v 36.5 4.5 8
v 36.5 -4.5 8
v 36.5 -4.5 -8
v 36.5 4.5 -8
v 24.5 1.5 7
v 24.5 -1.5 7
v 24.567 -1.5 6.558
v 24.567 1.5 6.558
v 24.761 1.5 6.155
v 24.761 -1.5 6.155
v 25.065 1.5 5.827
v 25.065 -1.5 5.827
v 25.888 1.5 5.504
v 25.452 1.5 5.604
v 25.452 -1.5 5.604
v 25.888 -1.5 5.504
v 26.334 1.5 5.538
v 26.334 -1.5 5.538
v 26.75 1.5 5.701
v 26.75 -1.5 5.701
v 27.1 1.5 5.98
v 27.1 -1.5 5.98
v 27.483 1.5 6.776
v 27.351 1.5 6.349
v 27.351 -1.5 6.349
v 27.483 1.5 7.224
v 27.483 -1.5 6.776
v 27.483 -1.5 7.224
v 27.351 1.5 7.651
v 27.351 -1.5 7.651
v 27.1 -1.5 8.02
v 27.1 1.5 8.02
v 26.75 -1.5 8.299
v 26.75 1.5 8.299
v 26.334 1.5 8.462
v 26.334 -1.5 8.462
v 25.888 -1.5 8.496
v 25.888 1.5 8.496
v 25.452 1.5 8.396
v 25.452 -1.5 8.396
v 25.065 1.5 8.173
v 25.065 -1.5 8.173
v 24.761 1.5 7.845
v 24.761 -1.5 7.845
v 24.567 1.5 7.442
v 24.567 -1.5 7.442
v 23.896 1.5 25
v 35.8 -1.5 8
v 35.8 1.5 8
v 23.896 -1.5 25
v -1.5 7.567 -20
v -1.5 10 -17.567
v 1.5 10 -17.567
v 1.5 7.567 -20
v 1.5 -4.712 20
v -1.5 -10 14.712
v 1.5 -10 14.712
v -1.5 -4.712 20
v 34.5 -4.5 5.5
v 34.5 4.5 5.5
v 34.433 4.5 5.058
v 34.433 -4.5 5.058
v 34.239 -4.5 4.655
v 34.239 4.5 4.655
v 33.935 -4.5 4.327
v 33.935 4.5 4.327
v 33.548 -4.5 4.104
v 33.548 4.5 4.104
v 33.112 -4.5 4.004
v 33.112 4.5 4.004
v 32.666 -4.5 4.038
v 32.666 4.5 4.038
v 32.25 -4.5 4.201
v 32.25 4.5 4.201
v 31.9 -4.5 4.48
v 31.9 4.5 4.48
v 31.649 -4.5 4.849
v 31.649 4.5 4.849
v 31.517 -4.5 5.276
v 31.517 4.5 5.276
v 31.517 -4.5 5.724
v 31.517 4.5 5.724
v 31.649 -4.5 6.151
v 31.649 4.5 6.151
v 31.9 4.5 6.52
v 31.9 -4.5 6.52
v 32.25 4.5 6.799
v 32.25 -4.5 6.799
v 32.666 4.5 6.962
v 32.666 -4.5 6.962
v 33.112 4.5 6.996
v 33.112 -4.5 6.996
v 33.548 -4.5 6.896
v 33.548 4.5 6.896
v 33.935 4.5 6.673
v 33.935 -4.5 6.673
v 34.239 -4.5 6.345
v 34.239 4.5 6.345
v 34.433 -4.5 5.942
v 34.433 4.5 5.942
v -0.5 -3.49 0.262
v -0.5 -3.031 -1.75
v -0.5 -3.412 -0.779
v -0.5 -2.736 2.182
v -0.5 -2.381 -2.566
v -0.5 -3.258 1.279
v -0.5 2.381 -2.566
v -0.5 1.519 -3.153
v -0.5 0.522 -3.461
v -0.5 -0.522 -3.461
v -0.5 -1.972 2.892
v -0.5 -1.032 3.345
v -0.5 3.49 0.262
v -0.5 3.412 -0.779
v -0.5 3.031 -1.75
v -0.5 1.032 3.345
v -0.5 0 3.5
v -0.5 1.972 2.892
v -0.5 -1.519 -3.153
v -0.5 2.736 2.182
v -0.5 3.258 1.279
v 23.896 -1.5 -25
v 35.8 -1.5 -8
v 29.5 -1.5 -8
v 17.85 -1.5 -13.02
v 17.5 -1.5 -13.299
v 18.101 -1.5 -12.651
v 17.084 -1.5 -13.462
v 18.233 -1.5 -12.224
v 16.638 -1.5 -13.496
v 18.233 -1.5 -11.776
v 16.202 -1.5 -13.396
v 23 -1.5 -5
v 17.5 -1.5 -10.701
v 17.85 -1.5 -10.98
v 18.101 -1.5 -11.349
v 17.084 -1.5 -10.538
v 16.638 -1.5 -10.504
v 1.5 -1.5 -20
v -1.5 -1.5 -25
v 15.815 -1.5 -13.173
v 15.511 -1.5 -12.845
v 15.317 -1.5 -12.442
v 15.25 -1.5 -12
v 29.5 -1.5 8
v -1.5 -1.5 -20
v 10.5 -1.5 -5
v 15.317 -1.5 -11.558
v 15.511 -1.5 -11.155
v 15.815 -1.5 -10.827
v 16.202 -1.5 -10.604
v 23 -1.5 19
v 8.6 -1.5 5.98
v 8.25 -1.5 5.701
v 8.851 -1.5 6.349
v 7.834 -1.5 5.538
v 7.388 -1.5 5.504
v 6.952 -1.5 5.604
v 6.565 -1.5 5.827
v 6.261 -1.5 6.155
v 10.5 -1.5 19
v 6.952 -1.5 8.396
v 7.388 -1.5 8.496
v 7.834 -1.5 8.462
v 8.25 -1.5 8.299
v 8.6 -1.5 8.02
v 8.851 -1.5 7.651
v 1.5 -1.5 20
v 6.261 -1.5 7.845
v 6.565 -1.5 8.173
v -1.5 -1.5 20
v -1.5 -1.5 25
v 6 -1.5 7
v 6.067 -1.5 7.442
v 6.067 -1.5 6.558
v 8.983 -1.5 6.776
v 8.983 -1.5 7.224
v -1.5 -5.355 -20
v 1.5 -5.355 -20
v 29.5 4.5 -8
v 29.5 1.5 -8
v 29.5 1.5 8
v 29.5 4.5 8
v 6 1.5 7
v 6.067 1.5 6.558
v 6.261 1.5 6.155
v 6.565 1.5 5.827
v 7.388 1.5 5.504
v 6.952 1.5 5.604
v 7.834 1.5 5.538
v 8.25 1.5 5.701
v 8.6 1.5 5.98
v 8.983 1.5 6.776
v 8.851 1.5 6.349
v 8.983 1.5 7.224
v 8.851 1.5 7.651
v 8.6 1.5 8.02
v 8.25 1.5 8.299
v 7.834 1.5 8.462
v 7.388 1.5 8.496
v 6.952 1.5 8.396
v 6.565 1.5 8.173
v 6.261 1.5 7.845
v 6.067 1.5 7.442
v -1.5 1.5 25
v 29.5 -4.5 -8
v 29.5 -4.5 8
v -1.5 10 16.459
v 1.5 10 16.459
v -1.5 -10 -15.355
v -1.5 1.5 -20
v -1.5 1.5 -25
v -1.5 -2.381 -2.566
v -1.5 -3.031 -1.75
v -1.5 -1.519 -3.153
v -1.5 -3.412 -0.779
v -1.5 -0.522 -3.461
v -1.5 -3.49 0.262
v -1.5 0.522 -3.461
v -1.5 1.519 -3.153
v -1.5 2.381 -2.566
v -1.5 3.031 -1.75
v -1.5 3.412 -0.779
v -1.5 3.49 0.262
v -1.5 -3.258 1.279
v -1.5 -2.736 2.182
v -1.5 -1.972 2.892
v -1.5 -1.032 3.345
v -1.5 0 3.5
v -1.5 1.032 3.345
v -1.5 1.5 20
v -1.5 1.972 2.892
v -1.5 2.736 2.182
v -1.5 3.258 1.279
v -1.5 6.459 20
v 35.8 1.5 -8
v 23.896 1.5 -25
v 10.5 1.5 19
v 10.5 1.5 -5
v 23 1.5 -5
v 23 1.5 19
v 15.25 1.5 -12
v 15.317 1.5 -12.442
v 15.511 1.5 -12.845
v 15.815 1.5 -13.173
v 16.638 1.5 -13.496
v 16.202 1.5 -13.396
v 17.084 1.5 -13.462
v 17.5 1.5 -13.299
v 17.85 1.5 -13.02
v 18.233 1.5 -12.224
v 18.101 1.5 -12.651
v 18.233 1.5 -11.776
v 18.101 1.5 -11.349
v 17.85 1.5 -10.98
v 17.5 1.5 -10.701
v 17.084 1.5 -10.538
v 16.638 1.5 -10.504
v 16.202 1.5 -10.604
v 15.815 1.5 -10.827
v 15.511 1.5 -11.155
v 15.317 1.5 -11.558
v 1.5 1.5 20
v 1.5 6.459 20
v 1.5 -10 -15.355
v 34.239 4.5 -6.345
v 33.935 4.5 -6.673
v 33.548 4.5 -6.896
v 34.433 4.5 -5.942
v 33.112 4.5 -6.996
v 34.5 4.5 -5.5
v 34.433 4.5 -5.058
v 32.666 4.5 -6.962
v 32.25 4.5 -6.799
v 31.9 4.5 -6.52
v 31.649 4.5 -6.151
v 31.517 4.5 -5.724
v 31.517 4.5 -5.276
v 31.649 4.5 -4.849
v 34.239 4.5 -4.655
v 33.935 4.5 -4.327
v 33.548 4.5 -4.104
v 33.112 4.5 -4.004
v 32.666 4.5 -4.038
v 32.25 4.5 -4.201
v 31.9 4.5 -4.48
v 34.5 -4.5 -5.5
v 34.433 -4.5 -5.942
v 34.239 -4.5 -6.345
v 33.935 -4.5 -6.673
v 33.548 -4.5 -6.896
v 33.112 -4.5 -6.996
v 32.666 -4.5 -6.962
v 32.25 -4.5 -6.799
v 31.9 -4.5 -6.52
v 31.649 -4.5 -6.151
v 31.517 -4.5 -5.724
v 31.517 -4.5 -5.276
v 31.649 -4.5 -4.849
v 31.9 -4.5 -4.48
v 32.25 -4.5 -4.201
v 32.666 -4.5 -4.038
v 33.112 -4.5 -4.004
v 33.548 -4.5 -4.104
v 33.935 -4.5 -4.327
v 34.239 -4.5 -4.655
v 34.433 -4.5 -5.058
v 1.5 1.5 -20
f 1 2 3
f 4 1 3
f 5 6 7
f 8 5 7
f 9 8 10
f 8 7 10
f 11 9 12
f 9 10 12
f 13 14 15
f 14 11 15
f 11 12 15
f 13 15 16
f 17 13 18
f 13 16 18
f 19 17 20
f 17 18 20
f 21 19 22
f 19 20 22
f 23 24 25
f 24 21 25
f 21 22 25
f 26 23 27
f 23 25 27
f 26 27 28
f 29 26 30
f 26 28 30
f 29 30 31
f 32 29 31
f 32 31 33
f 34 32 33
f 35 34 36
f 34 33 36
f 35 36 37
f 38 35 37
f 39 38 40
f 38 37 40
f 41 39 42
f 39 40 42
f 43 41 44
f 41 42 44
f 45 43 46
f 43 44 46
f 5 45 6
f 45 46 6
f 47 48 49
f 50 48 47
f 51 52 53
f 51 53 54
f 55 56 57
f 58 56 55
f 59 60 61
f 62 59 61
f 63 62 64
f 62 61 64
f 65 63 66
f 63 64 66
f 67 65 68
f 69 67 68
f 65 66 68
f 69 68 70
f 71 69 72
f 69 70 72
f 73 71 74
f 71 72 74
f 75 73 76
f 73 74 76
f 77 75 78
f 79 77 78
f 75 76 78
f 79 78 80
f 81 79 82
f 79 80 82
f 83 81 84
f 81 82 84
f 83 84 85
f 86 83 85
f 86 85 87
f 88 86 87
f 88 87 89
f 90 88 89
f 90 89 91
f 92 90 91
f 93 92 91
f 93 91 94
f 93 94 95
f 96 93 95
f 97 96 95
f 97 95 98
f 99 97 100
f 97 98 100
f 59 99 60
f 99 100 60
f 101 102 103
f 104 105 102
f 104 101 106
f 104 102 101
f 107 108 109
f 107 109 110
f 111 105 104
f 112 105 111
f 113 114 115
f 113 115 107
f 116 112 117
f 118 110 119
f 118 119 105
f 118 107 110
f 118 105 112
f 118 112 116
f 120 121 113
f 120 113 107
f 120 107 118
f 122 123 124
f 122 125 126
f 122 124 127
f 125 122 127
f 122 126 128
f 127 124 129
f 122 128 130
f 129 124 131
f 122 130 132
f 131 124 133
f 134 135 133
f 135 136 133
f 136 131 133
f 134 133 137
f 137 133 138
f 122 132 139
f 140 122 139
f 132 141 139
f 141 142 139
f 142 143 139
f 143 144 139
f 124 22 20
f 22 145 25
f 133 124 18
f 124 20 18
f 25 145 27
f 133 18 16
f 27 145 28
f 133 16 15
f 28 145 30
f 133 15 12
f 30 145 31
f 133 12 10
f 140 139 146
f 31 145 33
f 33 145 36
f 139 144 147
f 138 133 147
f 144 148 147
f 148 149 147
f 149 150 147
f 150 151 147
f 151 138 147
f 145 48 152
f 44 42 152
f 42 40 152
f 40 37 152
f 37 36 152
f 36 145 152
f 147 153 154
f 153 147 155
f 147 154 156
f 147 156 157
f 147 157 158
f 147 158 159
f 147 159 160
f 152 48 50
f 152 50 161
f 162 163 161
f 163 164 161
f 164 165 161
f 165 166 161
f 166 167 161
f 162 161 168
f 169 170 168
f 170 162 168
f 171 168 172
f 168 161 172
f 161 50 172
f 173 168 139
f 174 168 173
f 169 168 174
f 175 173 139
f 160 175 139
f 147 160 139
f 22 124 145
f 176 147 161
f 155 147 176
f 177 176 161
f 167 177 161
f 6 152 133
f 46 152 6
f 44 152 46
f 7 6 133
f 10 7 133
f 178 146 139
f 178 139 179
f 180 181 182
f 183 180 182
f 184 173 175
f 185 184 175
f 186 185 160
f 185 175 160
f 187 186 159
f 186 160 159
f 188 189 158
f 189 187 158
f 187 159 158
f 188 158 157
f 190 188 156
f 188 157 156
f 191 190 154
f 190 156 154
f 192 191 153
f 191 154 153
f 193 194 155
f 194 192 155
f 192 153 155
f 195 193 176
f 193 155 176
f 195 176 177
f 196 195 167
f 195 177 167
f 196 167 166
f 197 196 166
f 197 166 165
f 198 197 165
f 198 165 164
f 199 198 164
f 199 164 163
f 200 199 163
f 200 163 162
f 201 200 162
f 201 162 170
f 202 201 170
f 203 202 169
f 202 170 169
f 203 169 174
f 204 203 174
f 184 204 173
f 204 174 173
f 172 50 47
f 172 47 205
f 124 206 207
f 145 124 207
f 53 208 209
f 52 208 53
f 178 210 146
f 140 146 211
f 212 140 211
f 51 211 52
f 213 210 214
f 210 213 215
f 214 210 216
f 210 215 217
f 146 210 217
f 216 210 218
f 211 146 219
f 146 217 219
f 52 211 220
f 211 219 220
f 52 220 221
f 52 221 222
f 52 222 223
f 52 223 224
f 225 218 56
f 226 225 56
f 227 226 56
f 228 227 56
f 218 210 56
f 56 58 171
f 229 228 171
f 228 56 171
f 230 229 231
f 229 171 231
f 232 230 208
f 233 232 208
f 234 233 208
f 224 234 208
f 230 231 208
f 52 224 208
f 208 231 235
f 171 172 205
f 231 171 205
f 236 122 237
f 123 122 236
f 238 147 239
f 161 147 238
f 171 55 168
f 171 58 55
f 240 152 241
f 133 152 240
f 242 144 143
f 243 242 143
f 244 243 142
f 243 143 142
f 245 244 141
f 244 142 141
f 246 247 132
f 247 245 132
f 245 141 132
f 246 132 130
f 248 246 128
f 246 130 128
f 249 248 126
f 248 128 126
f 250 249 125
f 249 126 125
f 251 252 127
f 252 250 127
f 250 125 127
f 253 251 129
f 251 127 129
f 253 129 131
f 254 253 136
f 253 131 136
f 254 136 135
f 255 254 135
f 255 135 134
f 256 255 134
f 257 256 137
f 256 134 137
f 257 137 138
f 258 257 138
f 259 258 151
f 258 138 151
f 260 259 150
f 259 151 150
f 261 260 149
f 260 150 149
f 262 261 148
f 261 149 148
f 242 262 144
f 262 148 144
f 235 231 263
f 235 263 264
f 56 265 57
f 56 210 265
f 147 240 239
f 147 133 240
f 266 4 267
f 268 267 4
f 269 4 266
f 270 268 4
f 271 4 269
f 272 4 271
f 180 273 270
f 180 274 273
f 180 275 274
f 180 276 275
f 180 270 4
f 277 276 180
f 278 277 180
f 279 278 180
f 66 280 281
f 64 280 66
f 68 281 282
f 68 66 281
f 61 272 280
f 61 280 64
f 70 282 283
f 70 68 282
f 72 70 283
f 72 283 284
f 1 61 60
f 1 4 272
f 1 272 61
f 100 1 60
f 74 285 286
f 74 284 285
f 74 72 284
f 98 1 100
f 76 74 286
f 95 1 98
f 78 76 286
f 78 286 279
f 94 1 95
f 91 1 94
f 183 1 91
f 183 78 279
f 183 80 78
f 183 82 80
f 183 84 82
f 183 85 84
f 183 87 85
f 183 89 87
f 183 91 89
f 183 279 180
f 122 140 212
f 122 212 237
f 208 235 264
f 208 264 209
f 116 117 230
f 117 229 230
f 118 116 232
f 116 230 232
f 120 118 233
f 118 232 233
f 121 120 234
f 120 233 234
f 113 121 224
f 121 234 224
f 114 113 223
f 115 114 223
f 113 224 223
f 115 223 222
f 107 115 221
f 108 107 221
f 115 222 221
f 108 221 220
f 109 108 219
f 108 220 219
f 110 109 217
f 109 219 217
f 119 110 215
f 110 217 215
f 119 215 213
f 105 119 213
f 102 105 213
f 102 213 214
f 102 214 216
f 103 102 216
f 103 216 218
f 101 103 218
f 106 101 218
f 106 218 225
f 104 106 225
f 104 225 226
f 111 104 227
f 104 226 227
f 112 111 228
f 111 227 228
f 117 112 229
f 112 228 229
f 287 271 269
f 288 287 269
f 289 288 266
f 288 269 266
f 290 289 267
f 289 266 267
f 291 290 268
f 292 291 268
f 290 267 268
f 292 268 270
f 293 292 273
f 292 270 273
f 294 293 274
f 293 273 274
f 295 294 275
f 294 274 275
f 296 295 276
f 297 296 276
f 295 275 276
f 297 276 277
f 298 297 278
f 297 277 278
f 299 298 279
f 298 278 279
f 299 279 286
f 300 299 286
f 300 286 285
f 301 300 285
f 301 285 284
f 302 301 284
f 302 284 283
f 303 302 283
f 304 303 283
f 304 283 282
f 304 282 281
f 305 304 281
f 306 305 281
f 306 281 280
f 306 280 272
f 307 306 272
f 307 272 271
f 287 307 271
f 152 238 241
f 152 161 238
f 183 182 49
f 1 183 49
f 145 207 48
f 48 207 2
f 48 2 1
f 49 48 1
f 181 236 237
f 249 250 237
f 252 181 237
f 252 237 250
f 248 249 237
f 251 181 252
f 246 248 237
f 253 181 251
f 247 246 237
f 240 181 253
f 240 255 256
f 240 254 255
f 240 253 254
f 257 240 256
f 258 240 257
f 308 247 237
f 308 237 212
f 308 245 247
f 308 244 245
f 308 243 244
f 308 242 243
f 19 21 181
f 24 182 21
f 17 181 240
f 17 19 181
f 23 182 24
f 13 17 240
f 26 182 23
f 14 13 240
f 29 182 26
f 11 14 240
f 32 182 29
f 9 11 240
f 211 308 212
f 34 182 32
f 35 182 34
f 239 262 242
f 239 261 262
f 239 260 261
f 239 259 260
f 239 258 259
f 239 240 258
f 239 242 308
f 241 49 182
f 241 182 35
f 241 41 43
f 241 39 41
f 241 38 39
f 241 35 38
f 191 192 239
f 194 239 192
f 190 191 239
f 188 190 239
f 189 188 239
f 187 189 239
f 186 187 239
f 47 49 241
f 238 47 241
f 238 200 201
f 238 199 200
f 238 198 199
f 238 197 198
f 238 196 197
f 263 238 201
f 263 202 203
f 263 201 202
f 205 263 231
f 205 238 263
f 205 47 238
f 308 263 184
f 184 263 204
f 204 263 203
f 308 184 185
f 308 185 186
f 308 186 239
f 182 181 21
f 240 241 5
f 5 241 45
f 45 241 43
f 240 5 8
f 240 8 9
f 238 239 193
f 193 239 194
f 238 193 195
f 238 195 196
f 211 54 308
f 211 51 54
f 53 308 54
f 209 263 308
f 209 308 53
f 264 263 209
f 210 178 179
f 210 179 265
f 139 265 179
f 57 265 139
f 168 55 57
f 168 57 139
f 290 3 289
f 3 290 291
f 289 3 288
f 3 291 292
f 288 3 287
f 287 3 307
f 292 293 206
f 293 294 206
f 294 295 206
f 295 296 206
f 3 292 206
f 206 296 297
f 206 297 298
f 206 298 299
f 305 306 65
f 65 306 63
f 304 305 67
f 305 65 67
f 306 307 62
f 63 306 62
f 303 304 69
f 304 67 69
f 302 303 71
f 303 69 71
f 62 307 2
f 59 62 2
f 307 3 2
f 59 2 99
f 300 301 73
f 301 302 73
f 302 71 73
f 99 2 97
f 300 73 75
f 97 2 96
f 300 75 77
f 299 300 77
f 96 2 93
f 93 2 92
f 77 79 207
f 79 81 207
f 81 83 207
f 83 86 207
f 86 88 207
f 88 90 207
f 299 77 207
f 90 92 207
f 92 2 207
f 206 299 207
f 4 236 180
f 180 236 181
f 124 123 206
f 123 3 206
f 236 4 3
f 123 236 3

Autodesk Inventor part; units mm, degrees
ref_plane "YZ Plane" through (0, 0, 0) normal (1, 0, 0) x (0, 1, 0)
ref_plane "XZ Plane" through (0, 0, 0) normal (0, 1, 0) x (-1, 0, 0)
ref_plane "XY Plane" through (0, 0, 0) normal (0, 0, 1) x (1, 0, 0)
sketch "Boceto1" plane through (0, 0, 0) normal (1, 0, 0) x (0, 1, 0)
  line L0 (10, 16.4587) -> (10, -17.5667)
  line L1 (10, -17.5667) -> (7.5667, -20)
  line L2 (7.5667, -20) -> (-5.3553, -20)
  line L3 (-5.3553, -20) -> (-10, -15.3553)
  line L4 (-10, -15.3553) -> (-10, 14.7117)
  line L5 (-10, 14.7117) -> (-4.7117, 20)
  line L6 (-4.7117, 20) -> (6.4587, 20)
  line L7 (6.4587, 20) -> (10, 16.4587)
  line L8 (0, 0) -> (31.525, 0) construction
  line L9 (0, 0) -> (0, -54.6434) construction
  dimension "d0" = 135
  dimension "d2" = 135
  dimension "d3" = 135
  dimension "d5" = 40
  dimension "d6" = 20
extrude "Extrusión1" add sketch "Boceto1" along normal mid plane 3
sketch "Boceto2" plane through (0, 0, 0) normal (0, 1, 0) x (-1, 0, 0)
  line L0 (0, 0) -> (-24, 0) construction
  line L1 (1.5, -25) -> (-23.8963, -25)
  line L2 (-23.8963, -25) -> (-36.5, -7)
  line L3 (-36.5, -7) -> (-36.5, 7)
  line L4 (-36.5, 7) -> (-23.8963, 25)
  line L5 (-23.8963, 25) -> (1.5, 25)
  line L6 (-1.5, 20) -> (1.5, 20) projected
  line L7 (-1.5, -15.3553) -> (-1.5, -20) projected
  line L8 (-1.5, 20) -> (-1.5, -20)
  line L9 (1.5, 20) -> (-1.5, 20)
  line L10 (1.5, -20) -> (1.5, -15.3553) projected
  line L11 (1.5, -20) -> (-1.5, -20) projected
  line L12 (1.5, -20) -> (-1.5, -20)
  line L13 (1.5, -20) -> (1.5, -25)
  line L14 (1.5, 20) -> (1.5, 25)
  line L15 (1.5, 16.4587) -> (1.5, -17.5667) projected
  line L16 (-10.5, 19) -> (-23, 19)
  line L17 (-23, 19) -> (-23, -5)
  line L18 (-23, -5) -> (-10.5, -5)
  line L19 (-10.5, -5) -> (-10.5, 19)
  line L20 (-10.5, 7) -> (-23, 7) construction
  circle A0 centre (-7.5, 7) radius 1.5
  circle A1 centre (-26, 7) radius 1.5
  circle A2 centre (-16.75, -12) radius 1.5
  line L21 (-16.75, -5) -> (-16.75, -34) construction
  dimension "d9" = 50
  dimension "d10" = 38
  dimension "d11" = 145
  dimension "d12" = 145
  dimension "d13" = 12.5
  dimension "d14" = 24
  dimension "d15" = 6
  dimension "d16" = 12
  dimension "d17" = 3
  dimension "d18" = 3
  dimension "d19" = 3
  dimension "d20" = 3
  dimension "d21" = 3
  dimension "d22" = 7
extrude "Extrusión2" add sketch "Boceto2" along normal mid plane 3
sketch "Boceto3" plane through (0, 0, 0) normal (0, 1, 0) x (-1, 0, 0)
  line L0 (-36.5, -8) -> (-29.5, -8)
  line L1 (-29.5, -8) -> (-29.5, 8)
  line L2 (-29.5, 8) -> (-36.5, 8)
  line L3 (-36.5, 8) -> (-36.5, -8)
  line L4 (0, 0) -> (-66, 0) construction
  point P0 (-33, -8)
  point P1 (-33, 8)
  dimension "d25" = 7
  dimension "d34" = 8
  dimension "d35" = 8
extrude "Extrusión3" add sketch "Boceto3" along normal mid plane 9
sketch "Boceto4" plane through (0, 4.5, 0) normal (0, 1, 0) x (1, 0, 0)
  circle A0 centre (33, 5.5) radius 1.5
  circle A1 centre (33, -5.5) radius 1.5
  line L0 (-1.5, 15.3553) -> (-1.5, -14.7117) projected
  line L1 (-1.5, 0) -> (97, 0) construction
  line L2 (97, 0) -> (96, 0)
  point P0 (0, 0)
  dimension "d28" = 3
  dimension "d29" = 3
  dimension "d30" = 11
  dimension "d31" = 5.5
extrude "Extrusión4" cut sketch "Boceto4" against normal up to surface (9 mm away)
sketch "Boceto5" plane through (-1.5, 0, 0) normal (-1, 0, 0) x (0, 0, 1)
  circle A0 centre (0, 0) radius 3.5
  dimension "d38" = 7
extrude "Extrusión5" cut sketch "Boceto5" against normal blind 1
equation "\"Radio_pliegue\" = Grosor"
equation "\"Anchura_desahogo_plegado\" = Grosor"
equation "\"Profundidad_desahogo_plegado\" = 0.5 * Grosor"
equation "\"Tamaño_destalonado\" = 4 * Grosor"
equation "\"Remanente_mínimo\" = 2 * Grosor"
equation "\"Radiodetransición\" = Radio_pliegue"
equation "\"Tamaño_de_radio_de_Jacobi\" = Radio_pliegue"
equation "\"TamañoSeparación\" = Grosor"
equation "\"Grosor\" = 0.5"
properties part number "Pinza_pieza1"
